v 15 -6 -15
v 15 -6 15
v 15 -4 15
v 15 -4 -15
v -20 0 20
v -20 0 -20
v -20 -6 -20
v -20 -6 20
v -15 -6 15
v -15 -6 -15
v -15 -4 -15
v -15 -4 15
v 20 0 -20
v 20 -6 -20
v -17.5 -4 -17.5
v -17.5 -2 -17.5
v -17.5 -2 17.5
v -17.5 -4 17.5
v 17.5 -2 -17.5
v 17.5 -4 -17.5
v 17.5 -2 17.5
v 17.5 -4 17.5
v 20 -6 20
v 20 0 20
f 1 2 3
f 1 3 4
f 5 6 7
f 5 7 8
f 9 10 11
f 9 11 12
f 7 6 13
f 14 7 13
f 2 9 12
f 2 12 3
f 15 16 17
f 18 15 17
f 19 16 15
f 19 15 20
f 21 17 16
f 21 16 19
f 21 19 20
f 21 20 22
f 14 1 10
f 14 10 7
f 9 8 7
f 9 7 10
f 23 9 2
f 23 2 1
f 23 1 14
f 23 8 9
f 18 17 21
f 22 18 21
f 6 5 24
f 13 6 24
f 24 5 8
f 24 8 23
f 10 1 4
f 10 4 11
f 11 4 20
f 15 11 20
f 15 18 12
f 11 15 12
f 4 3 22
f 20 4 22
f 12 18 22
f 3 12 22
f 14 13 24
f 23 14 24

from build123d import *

# Parameters (mm, degrees)
F0_W     = 40
F0_H     = 40
F0_W_2   = 35
F0_H_2   = 35
F1_DEPTH = 6
F2_DEPTH = 2
F3_W     = 2.5
F3_H     = 30
F4_DEPTH = 2


with BuildPart() as f1:
    # F0 (on Front) → F1 (new body)
    with BuildSketch(Plane.XZ):
        Rectangle(F0_W, F0_H)
        Rectangle(F0_W_2, F0_H_2, mode=Mode.SUBTRACT)
    extrude(amount=F1_DEPTH)

    # F0 (on Front) → F2 (join)
    with BuildSketch(Plane.XZ):
        Rectangle(F0_W_2, F0_H_2)
    extrude(amount=F2_DEPTH)

    # F3 (on face) → F4 (join)
    with BuildSketch(Plane.XZ.offset(6)):
        Polygon((-17.5, 17.5), (-17.5, 15), (-15, 15), (15, 15), (17.5, 15), (17.5, 17.5), align=None)
        with Locations((-16.25, 0)):
            Rectangle(F3_W, F3_H)
        Polygon((-15, -15), (-17.5, -15), (-17.5, -17.5), (15, -17.5), (15, -15), align=None)
        Polygon((17.5, 15), (15, 15), (15, -15), (15, -17.5), (17.5, -17.5), align=None)
    extrude(amount=-F4_DEPTH)


solid = f1.part
